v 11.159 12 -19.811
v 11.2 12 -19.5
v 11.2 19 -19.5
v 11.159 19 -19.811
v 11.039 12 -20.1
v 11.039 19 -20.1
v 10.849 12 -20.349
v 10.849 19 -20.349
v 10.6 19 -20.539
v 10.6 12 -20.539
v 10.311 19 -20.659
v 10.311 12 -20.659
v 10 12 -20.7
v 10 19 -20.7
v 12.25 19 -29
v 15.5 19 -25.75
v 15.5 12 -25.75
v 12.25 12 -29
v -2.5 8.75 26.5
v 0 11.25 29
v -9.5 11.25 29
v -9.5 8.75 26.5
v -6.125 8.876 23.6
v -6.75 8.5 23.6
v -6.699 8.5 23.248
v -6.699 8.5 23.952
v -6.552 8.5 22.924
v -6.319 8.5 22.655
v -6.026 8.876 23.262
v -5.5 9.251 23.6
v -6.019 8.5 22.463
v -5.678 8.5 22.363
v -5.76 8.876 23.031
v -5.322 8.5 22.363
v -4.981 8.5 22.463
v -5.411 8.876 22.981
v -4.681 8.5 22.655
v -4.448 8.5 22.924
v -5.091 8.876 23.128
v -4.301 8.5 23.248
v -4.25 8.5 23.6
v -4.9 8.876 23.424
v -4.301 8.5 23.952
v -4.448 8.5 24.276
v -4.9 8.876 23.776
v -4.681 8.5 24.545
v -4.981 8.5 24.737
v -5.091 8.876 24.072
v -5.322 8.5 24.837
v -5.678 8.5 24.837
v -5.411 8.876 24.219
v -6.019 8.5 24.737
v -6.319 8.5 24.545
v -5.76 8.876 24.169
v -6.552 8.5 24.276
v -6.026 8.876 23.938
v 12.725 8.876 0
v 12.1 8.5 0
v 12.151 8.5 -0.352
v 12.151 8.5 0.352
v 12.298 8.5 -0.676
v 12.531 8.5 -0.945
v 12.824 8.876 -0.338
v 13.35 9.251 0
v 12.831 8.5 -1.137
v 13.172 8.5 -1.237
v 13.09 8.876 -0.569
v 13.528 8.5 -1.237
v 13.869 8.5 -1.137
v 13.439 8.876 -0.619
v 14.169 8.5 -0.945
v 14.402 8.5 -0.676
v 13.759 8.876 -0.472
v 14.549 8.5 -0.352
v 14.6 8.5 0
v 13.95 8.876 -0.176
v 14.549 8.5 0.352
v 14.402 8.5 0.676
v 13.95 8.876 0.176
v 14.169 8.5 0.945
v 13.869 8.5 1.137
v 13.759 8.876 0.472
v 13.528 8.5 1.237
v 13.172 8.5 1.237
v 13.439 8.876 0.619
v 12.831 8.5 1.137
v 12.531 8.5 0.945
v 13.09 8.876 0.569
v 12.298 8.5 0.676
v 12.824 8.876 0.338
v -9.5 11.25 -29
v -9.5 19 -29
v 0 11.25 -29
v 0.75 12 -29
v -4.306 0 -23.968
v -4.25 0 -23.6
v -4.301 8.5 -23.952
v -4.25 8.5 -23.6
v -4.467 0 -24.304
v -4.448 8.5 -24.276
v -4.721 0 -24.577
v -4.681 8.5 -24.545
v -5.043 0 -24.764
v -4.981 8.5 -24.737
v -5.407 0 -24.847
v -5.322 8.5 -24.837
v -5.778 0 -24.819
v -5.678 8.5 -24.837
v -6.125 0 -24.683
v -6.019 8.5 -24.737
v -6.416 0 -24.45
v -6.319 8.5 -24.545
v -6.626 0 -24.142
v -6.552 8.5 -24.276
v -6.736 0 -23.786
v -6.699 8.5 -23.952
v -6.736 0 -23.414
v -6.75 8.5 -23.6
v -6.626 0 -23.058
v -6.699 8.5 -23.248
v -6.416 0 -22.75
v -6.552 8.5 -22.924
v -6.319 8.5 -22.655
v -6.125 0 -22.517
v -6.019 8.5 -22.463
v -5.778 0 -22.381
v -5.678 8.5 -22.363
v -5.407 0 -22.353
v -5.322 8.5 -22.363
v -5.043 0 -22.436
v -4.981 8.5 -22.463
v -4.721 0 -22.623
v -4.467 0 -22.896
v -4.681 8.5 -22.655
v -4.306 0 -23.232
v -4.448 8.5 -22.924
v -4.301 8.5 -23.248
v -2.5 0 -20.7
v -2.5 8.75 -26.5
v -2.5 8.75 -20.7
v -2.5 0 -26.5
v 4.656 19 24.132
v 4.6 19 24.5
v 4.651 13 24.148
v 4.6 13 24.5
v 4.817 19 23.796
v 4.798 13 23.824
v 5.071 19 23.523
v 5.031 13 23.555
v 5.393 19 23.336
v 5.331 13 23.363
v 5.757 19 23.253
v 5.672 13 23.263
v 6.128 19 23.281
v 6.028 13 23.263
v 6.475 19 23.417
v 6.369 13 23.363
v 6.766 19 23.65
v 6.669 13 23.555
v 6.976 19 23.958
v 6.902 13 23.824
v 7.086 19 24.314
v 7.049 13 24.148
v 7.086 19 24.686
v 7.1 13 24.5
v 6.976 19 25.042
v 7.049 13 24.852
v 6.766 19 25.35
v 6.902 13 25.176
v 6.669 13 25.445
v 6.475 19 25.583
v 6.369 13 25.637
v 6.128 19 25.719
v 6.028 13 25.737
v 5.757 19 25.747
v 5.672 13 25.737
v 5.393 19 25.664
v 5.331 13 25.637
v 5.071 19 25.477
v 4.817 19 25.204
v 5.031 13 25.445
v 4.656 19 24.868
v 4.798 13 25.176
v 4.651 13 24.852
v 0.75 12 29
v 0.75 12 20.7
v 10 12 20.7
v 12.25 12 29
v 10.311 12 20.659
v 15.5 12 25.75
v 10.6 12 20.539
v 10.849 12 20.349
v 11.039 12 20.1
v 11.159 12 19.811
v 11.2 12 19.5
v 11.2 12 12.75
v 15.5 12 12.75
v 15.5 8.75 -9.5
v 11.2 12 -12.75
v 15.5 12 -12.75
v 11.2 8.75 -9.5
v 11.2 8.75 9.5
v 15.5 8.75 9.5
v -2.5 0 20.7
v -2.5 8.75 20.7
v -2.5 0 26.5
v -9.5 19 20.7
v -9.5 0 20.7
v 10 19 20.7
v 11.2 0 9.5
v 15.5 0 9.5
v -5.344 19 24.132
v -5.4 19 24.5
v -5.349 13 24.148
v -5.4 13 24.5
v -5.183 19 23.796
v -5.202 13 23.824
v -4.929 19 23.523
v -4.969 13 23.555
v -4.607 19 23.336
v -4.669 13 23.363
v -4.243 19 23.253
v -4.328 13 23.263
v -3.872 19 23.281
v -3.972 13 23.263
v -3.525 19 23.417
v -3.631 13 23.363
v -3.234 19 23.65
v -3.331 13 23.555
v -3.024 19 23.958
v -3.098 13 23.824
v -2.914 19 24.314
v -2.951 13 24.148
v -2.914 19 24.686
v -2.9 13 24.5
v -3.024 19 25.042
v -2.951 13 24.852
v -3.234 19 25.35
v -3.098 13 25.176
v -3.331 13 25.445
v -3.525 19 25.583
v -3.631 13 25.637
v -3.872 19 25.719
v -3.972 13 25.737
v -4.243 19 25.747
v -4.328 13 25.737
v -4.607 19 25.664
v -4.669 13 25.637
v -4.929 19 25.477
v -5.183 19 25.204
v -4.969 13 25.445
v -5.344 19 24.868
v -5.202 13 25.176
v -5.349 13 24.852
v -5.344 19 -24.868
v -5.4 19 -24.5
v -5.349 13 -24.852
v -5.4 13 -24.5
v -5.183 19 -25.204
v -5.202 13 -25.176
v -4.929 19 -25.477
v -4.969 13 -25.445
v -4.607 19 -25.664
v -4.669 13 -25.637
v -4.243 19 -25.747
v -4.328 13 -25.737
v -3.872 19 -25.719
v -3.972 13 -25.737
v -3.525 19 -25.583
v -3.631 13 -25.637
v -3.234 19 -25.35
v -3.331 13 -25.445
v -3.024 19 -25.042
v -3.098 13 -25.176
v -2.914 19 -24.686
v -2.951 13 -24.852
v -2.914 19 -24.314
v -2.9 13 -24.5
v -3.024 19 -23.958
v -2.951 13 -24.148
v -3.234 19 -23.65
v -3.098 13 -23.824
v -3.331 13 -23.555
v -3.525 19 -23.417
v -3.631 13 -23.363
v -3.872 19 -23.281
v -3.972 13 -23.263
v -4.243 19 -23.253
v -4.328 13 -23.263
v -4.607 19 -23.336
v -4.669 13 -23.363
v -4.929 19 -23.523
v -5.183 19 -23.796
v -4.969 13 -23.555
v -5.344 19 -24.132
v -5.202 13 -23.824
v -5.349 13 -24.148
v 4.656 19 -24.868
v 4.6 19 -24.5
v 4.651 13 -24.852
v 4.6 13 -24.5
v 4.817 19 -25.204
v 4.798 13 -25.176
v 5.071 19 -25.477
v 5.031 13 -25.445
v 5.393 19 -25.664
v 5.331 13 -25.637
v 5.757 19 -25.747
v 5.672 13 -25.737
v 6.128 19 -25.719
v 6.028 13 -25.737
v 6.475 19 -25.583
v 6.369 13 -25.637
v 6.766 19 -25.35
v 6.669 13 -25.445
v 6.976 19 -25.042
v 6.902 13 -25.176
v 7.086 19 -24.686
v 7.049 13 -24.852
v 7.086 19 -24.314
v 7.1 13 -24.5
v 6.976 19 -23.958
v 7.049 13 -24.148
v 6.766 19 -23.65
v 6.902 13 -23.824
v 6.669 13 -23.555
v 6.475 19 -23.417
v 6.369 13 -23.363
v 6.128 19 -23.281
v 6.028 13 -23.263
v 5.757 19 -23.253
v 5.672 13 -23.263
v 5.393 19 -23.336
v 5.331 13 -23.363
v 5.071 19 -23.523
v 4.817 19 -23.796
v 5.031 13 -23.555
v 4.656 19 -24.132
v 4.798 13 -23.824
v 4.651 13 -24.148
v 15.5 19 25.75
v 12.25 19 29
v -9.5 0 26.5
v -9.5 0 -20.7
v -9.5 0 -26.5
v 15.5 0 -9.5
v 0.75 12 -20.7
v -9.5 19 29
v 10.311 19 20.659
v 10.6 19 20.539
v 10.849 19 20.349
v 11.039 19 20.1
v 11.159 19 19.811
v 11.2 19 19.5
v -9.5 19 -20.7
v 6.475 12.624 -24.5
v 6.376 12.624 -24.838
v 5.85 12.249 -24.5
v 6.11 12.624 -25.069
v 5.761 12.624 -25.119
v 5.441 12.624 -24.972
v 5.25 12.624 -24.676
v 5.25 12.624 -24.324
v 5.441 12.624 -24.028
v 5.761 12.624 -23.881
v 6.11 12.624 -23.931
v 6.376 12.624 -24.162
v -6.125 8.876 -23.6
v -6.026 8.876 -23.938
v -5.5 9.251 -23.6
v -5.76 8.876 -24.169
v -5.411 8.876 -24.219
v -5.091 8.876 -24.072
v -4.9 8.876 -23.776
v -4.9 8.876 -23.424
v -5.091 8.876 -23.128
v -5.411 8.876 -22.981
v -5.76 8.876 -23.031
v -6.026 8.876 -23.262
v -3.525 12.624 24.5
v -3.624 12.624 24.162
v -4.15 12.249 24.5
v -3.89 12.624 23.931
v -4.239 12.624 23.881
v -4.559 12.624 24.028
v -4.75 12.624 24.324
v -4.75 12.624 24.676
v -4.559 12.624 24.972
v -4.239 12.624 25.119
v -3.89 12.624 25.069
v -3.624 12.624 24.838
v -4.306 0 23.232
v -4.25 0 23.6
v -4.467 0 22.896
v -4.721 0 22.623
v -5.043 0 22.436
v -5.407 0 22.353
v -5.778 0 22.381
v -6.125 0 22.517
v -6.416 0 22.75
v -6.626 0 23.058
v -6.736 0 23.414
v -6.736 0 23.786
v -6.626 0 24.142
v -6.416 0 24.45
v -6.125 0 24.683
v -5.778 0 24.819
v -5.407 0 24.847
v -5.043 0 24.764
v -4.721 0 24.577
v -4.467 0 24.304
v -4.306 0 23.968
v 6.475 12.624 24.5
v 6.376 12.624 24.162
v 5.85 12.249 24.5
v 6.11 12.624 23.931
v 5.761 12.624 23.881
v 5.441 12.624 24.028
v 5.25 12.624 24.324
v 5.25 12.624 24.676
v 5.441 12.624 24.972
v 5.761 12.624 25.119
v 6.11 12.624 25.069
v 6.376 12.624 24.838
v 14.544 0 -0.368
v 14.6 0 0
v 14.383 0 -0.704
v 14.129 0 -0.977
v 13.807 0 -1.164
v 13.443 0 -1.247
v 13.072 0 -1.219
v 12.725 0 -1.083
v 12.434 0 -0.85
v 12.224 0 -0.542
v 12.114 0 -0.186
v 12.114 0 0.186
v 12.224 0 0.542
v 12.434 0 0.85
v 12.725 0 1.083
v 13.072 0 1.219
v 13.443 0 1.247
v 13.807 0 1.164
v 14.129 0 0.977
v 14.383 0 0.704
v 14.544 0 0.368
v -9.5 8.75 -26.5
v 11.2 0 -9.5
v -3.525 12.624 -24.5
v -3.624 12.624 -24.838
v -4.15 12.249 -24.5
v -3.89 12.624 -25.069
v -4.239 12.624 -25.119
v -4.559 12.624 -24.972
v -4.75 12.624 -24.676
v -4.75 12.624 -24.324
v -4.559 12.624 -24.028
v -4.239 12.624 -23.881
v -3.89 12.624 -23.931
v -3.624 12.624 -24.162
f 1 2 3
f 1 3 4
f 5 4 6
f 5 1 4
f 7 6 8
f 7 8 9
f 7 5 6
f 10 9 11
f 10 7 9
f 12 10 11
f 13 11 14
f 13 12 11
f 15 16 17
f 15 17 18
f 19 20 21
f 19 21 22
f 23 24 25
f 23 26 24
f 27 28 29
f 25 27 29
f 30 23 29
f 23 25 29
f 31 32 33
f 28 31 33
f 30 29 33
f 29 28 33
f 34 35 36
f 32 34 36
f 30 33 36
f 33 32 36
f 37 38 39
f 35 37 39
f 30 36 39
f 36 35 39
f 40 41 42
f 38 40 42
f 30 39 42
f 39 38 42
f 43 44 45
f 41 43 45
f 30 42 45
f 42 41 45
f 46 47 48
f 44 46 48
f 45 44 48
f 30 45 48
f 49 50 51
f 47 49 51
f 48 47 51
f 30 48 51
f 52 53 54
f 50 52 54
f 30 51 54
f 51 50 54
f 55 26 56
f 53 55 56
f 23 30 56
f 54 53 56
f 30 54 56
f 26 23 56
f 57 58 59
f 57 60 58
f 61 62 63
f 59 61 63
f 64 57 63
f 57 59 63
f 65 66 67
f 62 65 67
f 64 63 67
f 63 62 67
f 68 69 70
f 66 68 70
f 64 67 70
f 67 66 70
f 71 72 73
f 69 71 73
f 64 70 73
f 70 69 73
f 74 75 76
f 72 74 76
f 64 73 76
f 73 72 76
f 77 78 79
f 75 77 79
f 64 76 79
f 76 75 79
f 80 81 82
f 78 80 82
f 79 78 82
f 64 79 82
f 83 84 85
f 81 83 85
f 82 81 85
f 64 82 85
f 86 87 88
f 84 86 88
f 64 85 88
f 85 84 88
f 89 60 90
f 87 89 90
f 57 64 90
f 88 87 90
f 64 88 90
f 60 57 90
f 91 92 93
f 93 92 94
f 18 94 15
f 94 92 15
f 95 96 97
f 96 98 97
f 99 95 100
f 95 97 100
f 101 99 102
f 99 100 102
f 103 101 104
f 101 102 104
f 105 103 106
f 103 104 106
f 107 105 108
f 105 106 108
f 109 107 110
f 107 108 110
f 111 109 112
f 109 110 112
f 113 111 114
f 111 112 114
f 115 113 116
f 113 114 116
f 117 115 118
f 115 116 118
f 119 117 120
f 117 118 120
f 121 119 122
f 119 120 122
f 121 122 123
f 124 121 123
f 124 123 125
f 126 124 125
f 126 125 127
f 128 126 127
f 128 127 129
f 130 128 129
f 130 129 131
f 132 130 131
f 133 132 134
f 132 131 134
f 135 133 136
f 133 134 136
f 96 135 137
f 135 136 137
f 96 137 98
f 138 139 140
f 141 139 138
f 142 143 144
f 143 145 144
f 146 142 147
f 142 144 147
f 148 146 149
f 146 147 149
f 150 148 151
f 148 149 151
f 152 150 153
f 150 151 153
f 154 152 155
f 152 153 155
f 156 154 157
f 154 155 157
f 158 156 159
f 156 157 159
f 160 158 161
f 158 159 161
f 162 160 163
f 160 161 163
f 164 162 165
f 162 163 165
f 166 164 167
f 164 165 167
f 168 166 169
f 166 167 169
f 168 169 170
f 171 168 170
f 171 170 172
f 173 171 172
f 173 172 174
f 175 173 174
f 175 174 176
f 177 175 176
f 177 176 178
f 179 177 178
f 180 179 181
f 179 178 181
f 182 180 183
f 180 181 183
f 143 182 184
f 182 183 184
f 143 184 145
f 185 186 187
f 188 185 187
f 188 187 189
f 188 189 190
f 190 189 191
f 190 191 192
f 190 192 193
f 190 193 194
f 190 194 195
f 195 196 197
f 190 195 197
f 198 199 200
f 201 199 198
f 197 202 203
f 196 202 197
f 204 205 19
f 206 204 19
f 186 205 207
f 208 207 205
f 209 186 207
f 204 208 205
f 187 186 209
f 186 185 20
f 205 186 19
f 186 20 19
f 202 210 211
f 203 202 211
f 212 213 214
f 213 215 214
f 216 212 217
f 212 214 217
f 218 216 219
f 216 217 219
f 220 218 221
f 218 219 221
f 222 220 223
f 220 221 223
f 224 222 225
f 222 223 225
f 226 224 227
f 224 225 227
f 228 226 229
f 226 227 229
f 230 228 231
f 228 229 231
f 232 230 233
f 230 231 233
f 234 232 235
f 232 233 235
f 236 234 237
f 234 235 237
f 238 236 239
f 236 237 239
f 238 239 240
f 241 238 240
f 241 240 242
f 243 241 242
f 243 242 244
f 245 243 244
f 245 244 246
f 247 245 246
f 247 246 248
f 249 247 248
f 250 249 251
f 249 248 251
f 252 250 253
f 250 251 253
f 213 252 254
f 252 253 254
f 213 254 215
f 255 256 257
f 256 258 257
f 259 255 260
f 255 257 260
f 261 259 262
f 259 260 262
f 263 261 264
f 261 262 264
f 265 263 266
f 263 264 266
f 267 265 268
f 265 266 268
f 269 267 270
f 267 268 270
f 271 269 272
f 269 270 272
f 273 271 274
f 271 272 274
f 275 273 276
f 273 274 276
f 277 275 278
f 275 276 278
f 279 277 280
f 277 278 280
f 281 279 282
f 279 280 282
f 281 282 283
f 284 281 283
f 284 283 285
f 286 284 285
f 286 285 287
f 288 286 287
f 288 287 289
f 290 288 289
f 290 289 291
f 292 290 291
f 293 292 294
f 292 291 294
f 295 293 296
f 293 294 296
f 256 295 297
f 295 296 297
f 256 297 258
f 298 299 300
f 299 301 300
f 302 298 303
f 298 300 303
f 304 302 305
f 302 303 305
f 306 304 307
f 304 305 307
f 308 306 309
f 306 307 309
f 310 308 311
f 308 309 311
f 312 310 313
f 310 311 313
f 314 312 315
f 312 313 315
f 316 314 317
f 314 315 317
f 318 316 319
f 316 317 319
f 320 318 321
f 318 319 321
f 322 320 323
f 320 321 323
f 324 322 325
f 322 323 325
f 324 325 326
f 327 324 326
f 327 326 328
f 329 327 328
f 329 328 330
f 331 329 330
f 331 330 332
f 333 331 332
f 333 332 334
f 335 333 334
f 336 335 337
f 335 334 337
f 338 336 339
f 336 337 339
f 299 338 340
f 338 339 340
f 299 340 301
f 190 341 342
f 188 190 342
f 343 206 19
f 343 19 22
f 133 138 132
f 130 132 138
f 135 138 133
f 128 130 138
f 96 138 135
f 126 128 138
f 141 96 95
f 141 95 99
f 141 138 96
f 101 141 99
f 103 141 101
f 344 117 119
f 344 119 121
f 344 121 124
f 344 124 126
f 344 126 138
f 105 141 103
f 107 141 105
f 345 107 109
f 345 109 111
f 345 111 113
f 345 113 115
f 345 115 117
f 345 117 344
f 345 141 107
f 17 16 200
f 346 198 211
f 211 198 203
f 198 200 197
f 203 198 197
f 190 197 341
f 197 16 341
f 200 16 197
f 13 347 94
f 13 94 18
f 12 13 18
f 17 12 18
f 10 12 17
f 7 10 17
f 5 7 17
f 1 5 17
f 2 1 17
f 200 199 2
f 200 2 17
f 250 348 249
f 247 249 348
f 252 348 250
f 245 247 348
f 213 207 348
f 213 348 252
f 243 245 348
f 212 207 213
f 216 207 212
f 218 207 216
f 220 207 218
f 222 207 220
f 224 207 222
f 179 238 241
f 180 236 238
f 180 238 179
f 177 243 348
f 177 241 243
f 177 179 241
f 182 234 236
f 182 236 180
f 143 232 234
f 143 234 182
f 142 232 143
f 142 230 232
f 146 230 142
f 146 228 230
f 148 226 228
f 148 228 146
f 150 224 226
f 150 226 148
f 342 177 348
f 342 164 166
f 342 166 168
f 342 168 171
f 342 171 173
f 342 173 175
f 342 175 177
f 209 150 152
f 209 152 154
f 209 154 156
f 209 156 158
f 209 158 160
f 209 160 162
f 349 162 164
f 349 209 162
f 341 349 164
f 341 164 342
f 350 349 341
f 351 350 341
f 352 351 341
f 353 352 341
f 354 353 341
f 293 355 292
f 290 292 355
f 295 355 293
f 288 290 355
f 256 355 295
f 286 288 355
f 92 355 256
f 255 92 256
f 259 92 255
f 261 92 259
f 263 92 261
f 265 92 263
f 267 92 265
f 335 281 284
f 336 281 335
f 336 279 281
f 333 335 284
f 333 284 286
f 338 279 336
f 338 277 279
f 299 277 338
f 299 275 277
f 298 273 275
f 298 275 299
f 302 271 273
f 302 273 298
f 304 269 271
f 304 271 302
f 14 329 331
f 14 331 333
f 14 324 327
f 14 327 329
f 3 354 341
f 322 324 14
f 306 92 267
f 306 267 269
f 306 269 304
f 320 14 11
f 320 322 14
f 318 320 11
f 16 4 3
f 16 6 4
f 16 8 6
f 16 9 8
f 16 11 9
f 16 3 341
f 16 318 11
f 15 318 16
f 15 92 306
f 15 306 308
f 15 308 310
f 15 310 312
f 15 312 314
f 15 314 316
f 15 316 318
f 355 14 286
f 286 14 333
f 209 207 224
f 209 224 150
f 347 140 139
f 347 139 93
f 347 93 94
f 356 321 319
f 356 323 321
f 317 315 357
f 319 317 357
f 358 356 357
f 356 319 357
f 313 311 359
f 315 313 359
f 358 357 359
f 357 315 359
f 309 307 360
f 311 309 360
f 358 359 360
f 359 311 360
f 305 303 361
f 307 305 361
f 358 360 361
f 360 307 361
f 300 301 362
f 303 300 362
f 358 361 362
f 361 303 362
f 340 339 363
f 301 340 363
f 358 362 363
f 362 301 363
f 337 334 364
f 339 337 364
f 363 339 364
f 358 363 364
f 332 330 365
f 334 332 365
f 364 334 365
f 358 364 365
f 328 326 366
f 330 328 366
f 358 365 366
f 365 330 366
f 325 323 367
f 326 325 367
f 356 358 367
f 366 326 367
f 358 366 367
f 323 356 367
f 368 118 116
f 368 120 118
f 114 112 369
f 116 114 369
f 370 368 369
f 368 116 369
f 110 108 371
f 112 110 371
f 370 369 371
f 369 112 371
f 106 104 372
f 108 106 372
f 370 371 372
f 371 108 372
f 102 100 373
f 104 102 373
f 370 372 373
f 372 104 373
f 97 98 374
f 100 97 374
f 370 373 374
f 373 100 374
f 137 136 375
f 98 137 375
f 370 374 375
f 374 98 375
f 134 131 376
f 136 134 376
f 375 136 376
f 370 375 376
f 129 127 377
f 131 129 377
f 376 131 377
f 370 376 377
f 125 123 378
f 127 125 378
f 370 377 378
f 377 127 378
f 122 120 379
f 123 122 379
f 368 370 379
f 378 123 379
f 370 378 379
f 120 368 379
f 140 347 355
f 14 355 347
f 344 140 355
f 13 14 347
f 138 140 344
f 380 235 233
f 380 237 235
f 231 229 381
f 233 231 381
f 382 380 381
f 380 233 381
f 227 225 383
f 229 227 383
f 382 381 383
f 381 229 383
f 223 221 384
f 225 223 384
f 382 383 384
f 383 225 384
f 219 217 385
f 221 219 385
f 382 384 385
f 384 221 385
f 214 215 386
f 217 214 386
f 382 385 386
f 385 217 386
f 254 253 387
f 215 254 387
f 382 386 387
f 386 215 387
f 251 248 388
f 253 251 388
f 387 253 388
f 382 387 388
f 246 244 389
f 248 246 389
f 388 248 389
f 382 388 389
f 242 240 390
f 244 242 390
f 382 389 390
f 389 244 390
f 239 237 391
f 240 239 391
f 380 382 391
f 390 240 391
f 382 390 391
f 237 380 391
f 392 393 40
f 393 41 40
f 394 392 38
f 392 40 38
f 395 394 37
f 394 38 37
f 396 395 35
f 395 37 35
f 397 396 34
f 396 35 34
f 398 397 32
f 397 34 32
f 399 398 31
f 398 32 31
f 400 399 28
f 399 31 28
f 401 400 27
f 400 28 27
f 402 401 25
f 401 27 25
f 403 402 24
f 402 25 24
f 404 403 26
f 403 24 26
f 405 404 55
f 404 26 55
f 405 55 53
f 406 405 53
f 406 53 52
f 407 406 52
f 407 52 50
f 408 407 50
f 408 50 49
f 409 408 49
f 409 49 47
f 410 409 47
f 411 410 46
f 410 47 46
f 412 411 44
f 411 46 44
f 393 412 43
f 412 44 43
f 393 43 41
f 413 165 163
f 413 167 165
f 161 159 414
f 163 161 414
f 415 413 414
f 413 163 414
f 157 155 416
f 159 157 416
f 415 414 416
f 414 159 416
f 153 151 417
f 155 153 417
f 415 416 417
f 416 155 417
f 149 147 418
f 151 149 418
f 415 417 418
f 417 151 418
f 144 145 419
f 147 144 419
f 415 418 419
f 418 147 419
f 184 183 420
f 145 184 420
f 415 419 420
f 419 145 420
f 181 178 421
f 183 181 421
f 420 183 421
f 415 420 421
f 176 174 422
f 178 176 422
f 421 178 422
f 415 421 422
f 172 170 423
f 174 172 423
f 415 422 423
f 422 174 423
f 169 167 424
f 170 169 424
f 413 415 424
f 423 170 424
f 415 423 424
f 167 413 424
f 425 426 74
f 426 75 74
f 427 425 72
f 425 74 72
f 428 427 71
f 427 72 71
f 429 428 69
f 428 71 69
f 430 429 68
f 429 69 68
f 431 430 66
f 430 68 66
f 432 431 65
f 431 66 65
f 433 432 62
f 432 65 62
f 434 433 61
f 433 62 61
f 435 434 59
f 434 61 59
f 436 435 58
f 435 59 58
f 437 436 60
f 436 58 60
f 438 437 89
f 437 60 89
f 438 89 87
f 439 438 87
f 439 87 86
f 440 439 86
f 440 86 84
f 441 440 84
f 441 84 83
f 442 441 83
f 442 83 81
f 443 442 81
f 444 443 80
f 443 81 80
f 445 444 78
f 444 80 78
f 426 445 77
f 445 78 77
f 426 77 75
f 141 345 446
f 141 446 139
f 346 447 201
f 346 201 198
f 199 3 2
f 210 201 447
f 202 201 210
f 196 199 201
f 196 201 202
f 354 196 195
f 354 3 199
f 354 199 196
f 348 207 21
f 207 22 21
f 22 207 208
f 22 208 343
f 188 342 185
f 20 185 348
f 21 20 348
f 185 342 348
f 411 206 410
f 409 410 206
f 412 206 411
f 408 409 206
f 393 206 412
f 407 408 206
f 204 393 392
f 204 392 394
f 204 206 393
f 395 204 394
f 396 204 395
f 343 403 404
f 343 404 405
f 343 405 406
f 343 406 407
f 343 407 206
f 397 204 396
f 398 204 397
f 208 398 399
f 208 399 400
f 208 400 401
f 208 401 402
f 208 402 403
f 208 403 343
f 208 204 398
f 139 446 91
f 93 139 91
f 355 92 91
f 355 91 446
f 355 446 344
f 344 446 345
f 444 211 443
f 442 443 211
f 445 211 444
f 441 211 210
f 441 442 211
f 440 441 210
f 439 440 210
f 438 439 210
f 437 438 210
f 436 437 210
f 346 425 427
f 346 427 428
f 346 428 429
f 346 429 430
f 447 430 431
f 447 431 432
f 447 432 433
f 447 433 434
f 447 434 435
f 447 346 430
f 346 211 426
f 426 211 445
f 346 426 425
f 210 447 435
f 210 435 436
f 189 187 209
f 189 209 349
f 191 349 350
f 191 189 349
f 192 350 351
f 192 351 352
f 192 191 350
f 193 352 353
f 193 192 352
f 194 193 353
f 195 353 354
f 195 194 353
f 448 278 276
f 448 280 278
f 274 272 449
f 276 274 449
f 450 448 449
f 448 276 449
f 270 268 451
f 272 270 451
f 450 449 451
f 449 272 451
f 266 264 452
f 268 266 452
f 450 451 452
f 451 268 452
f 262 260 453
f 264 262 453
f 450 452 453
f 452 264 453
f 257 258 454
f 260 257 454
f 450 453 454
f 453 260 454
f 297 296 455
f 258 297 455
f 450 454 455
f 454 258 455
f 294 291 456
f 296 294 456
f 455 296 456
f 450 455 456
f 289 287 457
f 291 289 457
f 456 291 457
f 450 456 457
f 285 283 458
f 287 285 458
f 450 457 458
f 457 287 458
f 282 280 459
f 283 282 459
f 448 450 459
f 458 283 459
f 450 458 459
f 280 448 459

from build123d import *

# Parameters (mm, degrees)
BOSS_EXTRU_1_DEPTH      = 19
ESQUISSE2_W             = 18
ESQUISSE2_H             = 17
ENL_V_MAT_EXTRU_1_DEPTH = 12
TROU_TARAUD_M31_D       = 2.5
TROU_TARAUD_M31_DEPTH   = 8.5
TROU_TARAUD_M31_TIP     = 0.751075774
ESQUISSE7_W             = 25
ESQUISSE7_H             = 8.3
BOSS_EXTRU_2_DEPTH      = 7
CHANFREIN3_SIZE         = 3.25
TROU_TARAUD_M32_D       = 2.5
TROU_TARAUD_M32_DEPTH   = 6
TROU_TARAUD_M32_TIP     = 0.751075774


with BuildPart() as part:
    # Esquisse1 → Boss.-Extru.1 (new body)
    with BuildSketch(Plane(origin=(0, 0, 0), x_dir=(1, 0, 0), z_dir=(0, 1, 0))):
        with BuildLine():
            Line((-9.5, 20.7), (-9.5, 26.5))
            Line((-9.5, 26.5), (15.5, 26.5))
            Line((15.5, 26.5), (15.5, -26.5))
            Line((15.5, -26.5), (-9.5, -26.5))
            Line((-9.5, -26.5), (-9.5, -20.7))
            Line((-9.5, -20.7), (10, -20.7))
            ThreePointArc((10, -20.7), (10.848528137, -20.348528137), (11.2, -19.5))
            Line((11.2, -19.5), (11.2, 19.5))
            ThreePointArc((11.2, 19.5), (10.848528137, 20.348528137), (10, 20.7))
            Line((10, 20.7), (-9.5, 20.7))
        make_face()
    extrude(amount=BOSS_EXTRU_1_DEPTH)

    # Esquisse2 → Enlèv. mat.-Extru.1 (cut)
    with BuildSketch(Plane.XZ):
        with Locations((6.5, 18)):
            Rectangle(ESQUISSE2_W, ESQUISSE2_H)
        with Locations((6.5, -18)):
            Rectangle(ESQUISSE2_W, ESQUISSE2_H)
    extrude(amount=-ENL_V_MAT_EXTRU_1_DEPTH, mode=Mode.SUBTRACT)

    # Trou taraudé M31
    with Locations(Plane(origin=(0, 0, 0), x_dir=(-1, 0, 0), z_dir=(0, -1, 0))):
        with Locations((5.5, 23.6), (-13.35, 0), (5.5, -23.6)):
            Hole(TROU_TARAUD_M31_D / 2, depth=TROU_TARAUD_M31_DEPTH)
            with Locations((0, 0, -(TROU_TARAUD_M31_DEPTH + TROU_TARAUD_M31_TIP / 2))):  # 118° drill point
                Cone(0, TROU_TARAUD_M31_D / 2, TROU_TARAUD_M31_TIP, mode=Mode.SUBTRACT)

    # Esquisse7 → Boss.-Extru.2 (add)
    with BuildSketch(Plane(origin=(0, 19, 0), x_dir=(1, 0, 0), z_dir=(0, 1, 0))):
        with Locations((3, -24.85)):
            Rectangle(ESQUISSE7_W, ESQUISSE7_H)
        with Locations((3, 24.85)):
            Rectangle(ESQUISSE7_W, ESQUISSE7_H)
    extrude(amount=-BOSS_EXTRU_2_DEPTH)

    # Chanfrein3
    # the kernel refuses this chamfer: 3.25 mm, written as the material it adds along each edge
    with BuildSketch(Plane(origin=(11.2, 12, -9.5), x_dir=(0, 0.027495876610586424, -0.9996219169112968), z_dir=(1, 0, 0)), Plane(origin=(11.2, 12, 9.5), x_dir=(0, -0.9996219169112968, -0.027495876610586424), z_dir=(1, 0, 0))) as chanfrein3_piece_1:
        Polygon((CHANFREIN3_SIZE * 0.999621916911, -CHANFREIN3_SIZE * 0.0274958766106), (-CHANFREIN3_SIZE * 0.0274958766106, -CHANFREIN3_SIZE * 0.999621916911), (0, 0), align=None)
    extrude(amount=4.3)
    with BuildSketch(Plane(origin=(-9.5, 12, -26.5), x_dir=(0, -0.9996219169112968, 0.027495876610586424), z_dir=(1, 0, 0))) as chanfrein3_piece_2_section:
        Polygon((CHANFREIN3_SIZE * 0.999621916911, CHANFREIN3_SIZE * 0.0274958766106), (-CHANFREIN3_SIZE * 0.0274958766106, CHANFREIN3_SIZE * 0.999621916911), (0, 0), align=None)
    chanfrein3_piece_2 = extrude(amount=7, mode=Mode.PRIVATE)
    chanfrein3_piece_2 = split(chanfrein3_piece_2, bisect_by=Plane(origin=(-6, 10.864243408, -29), z_dir=(0, 0, 1)), keep=Keep.TOP, mode=Mode.PRIVATE)
    add(chanfrein3_piece_2)
    with BuildSketch(Plane(origin=(-2.5, 12, -26.5), x_dir=(-0.027495876610586424, -0.9996219169112968, 0), z_dir=(0, 0, 1)), Plane(origin=(-2.5, 12, 26.5), x_dir=(0.9996219169112966, 0.027495876610586428, 0), z_dir=(0, 0, -1))) as chanfrein3_piece_3:
        Polygon((CHANFREIN3_SIZE * 0.999621916911, CHANFREIN3_SIZE * 0.0274958766106), (-CHANFREIN3_SIZE * 0.0274958766106, CHANFREIN3_SIZE * 0.999621916911), (0, 0), align=None)
    extrude(amount=5.8)
    with BuildSketch(Plane(origin=(-9.5, 12, 26.5), x_dir=(0, 0.027495876610586424, 0.9996219169112968), z_dir=(1, 0, 0))) as chanfrein3_piece_4_section:
        Polygon((CHANFREIN3_SIZE * 0.999621916911, CHANFREIN3_SIZE * 0.0274958766106), (-CHANFREIN3_SIZE * 0.0274958766106, CHANFREIN3_SIZE * 0.999621916911), (0, 0), align=None)
    chanfrein3_piece_4 = extrude(amount=7, mode=Mode.PRIVATE)
    chanfrein3_piece_4 = split(chanfrein3_piece_4, bisect_by=Plane(origin=(-6, 10.864243408, 29), z_dir=(0, 0, -1)), keep=Keep.TOP, mode=Mode.PRIVATE)
    add(chanfrein3_piece_4)
    with BuildSketch(Plane(origin=(-9.5, 12, -26.5), x_dir=(0, -0.9996219169112968, 0.027495876610586424), z_dir=(1, 0, 0))) as chanfrein3_piece_5a_section:
        Polygon((CHANFREIN3_SIZE * 0.999621916911, CHANFREIN3_SIZE * 0.0274958766106), (-CHANFREIN3_SIZE * 0.0274958766106, CHANFREIN3_SIZE * 0.999621916911), (0, 0), align=None)
    chanfrein3_piece_5a = extrude(amount=15.357969711, mode=Mode.PRIVATE)
    chanfrein3_piece_5a = split(chanfrein3_piece_5a, bisect_by=Plane(origin=(-2.5, 10.864243408, -27.44984941), z_dir=(1, 0, 0)), keep=Keep.TOP, mode=Mode.PRIVATE)
    chanfrein3_piece_5a = split(chanfrein3_piece_5a, bisect_by=Plane(origin=(1.678984855, 10.864243408, -29), z_dir=(0, 0, 1)), keep=Keep.TOP, mode=Mode.PRIVATE)
    with BuildSketch(Plane(origin=(-2.5, 12, -34.857969711), x_dir=(-0.027495876610586424, -0.9996219169112968, 0), z_dir=(0, 0, 1))) as chanfrein3_piece_5b_section:
        Polygon((CHANFREIN3_SIZE * 0.999621916911, CHANFREIN3_SIZE * 0.0274958766106), (-CHANFREIN3_SIZE * 0.0274958766106, CHANFREIN3_SIZE * 0.999621916911), (0, 0), align=None)
    chanfrein3_piece_5b = extrude(amount=14.157969711, mode=Mode.PRIVATE)
    chanfrein3_piece_5b = split(chanfrein3_piece_5b, bisect_by=Plane(origin=(-1.428170713, 10.928170713, -26.5), z_dir=(0, 0, -1)), keep=Keep.TOP, mode=Mode.PRIVATE)
    chanfrein3_piece_5b = split(chanfrein3_piece_5b, bisect_by=Plane(origin=(-1.428170713, 10.928170713, -29), z_dir=(0, 0, 1)), keep=Keep.TOP, mode=Mode.PRIVATE)
    chanfrein3_piece_5 = chanfrein3_piece_5a & chanfrein3_piece_5b
    add(chanfrein3_piece_5)
    with BuildSketch(Plane(origin=(-9.5, 12, 26.5), x_dir=(0, 0.027495876610586424, 0.9996219169112968), z_dir=(1, 0, 0))) as chanfrein3_piece_6a_section:
        Polygon((CHANFREIN3_SIZE * 0.999621916911, CHANFREIN3_SIZE * 0.0274958766106), (-CHANFREIN3_SIZE * 0.0274958766106, CHANFREIN3_SIZE * 0.999621916911), (0, 0), align=None)
    chanfrein3_piece_6a = extrude(amount=15.357969711, mode=Mode.PRIVATE)
    chanfrein3_piece_6a = split(chanfrein3_piece_6a, bisect_by=Plane(origin=(1.678984855, 10.864243408, 29), z_dir=(0, 0, -1)), keep=Keep.TOP, mode=Mode.PRIVATE)
    chanfrein3_piece_6a = split(chanfrein3_piece_6a, bisect_by=Plane(origin=(-2.5, 10.864243408, 27.44984941), z_dir=(1, 0, 0)), keep=Keep.TOP, mode=Mode.PRIVATE)
    with BuildSketch(Plane(origin=(-2.5, 12, 34.857969711), x_dir=(0.9996219169112968, 0.027495876610586424, 0), z_dir=(0, 0, -1))) as chanfrein3_piece_6b_section:
        Polygon((CHANFREIN3_SIZE * 0.999621916911, CHANFREIN3_SIZE * 0.0274958766106), (-CHANFREIN3_SIZE * 0.0274958766106, CHANFREIN3_SIZE * 0.999621916911), (0, 0), align=None)
    chanfrein3_piece_6b = extrude(amount=14.157969711, mode=Mode.PRIVATE)
    chanfrein3_piece_6b = split(chanfrein3_piece_6b, bisect_by=Plane(origin=(-1.428170713, 10.928170713, 29), z_dir=(0, 0, -1)), keep=Keep.TOP, mode=Mode.PRIVATE)
    chanfrein3_piece_6b = split(chanfrein3_piece_6b, bisect_by=Plane(origin=(-1.428170713, 10.928170713, 26.5), z_dir=(0, 0, 1)), keep=Keep.TOP, mode=Mode.PRIVATE)
    chanfrein3_piece_6 = chanfrein3_piece_6a & chanfrein3_piece_6b
    add(chanfrein3_piece_6)
    # the kernel refuses this chamfer: 3.25 mm, written as the material it takes off along each edge
    with BuildSketch(Plane(origin=(15.5, 27.357969711, 29), x_dir=(0.027495876610586424, 0, -0.9996219169112968), z_dir=(0, -1, 0))) as chanfrein3_2_piece_1:
        Polygon((CHANFREIN3_SIZE * 0.999621916911, -CHANFREIN3_SIZE * 0.0274958766106), (-CHANFREIN3_SIZE * 0.0274958766106, -CHANFREIN3_SIZE * 0.999621916911), (0, 0), align=None)
    extrude(amount=23.715939422, mode=Mode.SUBTRACT)
    with BuildSketch(Plane(origin=(15.5, 27.357969711, -29), x_dir=(0.027495876610586424, 0, 0.9996219169112968), z_dir=(0, -1, 0))) as chanfrein3_2_piece_2:
        Polygon((CHANFREIN3_SIZE * 0.999621916911, CHANFREIN3_SIZE * 0.0274958766106), (-CHANFREIN3_SIZE * 0.0274958766106, CHANFREIN3_SIZE * 0.999621916911), (0, 0), align=None)
    extrude(amount=23.715939422, mode=Mode.SUBTRACT)

    # Trou taraudé M32
    with Locations(Plane(origin=(0, 19, 0), x_dir=(1, 0, 0), z_dir=(0, 1, 0))):
        with Locations((-4.15, 24.5), (-4.15, -24.5), (5.85, -24.5), (5.85, 24.5)):
            Hole(TROU_TARAUD_M32_D / 2, depth=TROU_TARAUD_M32_DEPTH)
            with Locations((0, 0, -(TROU_TARAUD_M32_DEPTH + TROU_TARAUD_M32_TIP / 2))):  # 118° drill point
                Cone(0, TROU_TARAUD_M32_D / 2, TROU_TARAUD_M32_TIP, mode=Mode.SUBTRACT)


solid = part.part
